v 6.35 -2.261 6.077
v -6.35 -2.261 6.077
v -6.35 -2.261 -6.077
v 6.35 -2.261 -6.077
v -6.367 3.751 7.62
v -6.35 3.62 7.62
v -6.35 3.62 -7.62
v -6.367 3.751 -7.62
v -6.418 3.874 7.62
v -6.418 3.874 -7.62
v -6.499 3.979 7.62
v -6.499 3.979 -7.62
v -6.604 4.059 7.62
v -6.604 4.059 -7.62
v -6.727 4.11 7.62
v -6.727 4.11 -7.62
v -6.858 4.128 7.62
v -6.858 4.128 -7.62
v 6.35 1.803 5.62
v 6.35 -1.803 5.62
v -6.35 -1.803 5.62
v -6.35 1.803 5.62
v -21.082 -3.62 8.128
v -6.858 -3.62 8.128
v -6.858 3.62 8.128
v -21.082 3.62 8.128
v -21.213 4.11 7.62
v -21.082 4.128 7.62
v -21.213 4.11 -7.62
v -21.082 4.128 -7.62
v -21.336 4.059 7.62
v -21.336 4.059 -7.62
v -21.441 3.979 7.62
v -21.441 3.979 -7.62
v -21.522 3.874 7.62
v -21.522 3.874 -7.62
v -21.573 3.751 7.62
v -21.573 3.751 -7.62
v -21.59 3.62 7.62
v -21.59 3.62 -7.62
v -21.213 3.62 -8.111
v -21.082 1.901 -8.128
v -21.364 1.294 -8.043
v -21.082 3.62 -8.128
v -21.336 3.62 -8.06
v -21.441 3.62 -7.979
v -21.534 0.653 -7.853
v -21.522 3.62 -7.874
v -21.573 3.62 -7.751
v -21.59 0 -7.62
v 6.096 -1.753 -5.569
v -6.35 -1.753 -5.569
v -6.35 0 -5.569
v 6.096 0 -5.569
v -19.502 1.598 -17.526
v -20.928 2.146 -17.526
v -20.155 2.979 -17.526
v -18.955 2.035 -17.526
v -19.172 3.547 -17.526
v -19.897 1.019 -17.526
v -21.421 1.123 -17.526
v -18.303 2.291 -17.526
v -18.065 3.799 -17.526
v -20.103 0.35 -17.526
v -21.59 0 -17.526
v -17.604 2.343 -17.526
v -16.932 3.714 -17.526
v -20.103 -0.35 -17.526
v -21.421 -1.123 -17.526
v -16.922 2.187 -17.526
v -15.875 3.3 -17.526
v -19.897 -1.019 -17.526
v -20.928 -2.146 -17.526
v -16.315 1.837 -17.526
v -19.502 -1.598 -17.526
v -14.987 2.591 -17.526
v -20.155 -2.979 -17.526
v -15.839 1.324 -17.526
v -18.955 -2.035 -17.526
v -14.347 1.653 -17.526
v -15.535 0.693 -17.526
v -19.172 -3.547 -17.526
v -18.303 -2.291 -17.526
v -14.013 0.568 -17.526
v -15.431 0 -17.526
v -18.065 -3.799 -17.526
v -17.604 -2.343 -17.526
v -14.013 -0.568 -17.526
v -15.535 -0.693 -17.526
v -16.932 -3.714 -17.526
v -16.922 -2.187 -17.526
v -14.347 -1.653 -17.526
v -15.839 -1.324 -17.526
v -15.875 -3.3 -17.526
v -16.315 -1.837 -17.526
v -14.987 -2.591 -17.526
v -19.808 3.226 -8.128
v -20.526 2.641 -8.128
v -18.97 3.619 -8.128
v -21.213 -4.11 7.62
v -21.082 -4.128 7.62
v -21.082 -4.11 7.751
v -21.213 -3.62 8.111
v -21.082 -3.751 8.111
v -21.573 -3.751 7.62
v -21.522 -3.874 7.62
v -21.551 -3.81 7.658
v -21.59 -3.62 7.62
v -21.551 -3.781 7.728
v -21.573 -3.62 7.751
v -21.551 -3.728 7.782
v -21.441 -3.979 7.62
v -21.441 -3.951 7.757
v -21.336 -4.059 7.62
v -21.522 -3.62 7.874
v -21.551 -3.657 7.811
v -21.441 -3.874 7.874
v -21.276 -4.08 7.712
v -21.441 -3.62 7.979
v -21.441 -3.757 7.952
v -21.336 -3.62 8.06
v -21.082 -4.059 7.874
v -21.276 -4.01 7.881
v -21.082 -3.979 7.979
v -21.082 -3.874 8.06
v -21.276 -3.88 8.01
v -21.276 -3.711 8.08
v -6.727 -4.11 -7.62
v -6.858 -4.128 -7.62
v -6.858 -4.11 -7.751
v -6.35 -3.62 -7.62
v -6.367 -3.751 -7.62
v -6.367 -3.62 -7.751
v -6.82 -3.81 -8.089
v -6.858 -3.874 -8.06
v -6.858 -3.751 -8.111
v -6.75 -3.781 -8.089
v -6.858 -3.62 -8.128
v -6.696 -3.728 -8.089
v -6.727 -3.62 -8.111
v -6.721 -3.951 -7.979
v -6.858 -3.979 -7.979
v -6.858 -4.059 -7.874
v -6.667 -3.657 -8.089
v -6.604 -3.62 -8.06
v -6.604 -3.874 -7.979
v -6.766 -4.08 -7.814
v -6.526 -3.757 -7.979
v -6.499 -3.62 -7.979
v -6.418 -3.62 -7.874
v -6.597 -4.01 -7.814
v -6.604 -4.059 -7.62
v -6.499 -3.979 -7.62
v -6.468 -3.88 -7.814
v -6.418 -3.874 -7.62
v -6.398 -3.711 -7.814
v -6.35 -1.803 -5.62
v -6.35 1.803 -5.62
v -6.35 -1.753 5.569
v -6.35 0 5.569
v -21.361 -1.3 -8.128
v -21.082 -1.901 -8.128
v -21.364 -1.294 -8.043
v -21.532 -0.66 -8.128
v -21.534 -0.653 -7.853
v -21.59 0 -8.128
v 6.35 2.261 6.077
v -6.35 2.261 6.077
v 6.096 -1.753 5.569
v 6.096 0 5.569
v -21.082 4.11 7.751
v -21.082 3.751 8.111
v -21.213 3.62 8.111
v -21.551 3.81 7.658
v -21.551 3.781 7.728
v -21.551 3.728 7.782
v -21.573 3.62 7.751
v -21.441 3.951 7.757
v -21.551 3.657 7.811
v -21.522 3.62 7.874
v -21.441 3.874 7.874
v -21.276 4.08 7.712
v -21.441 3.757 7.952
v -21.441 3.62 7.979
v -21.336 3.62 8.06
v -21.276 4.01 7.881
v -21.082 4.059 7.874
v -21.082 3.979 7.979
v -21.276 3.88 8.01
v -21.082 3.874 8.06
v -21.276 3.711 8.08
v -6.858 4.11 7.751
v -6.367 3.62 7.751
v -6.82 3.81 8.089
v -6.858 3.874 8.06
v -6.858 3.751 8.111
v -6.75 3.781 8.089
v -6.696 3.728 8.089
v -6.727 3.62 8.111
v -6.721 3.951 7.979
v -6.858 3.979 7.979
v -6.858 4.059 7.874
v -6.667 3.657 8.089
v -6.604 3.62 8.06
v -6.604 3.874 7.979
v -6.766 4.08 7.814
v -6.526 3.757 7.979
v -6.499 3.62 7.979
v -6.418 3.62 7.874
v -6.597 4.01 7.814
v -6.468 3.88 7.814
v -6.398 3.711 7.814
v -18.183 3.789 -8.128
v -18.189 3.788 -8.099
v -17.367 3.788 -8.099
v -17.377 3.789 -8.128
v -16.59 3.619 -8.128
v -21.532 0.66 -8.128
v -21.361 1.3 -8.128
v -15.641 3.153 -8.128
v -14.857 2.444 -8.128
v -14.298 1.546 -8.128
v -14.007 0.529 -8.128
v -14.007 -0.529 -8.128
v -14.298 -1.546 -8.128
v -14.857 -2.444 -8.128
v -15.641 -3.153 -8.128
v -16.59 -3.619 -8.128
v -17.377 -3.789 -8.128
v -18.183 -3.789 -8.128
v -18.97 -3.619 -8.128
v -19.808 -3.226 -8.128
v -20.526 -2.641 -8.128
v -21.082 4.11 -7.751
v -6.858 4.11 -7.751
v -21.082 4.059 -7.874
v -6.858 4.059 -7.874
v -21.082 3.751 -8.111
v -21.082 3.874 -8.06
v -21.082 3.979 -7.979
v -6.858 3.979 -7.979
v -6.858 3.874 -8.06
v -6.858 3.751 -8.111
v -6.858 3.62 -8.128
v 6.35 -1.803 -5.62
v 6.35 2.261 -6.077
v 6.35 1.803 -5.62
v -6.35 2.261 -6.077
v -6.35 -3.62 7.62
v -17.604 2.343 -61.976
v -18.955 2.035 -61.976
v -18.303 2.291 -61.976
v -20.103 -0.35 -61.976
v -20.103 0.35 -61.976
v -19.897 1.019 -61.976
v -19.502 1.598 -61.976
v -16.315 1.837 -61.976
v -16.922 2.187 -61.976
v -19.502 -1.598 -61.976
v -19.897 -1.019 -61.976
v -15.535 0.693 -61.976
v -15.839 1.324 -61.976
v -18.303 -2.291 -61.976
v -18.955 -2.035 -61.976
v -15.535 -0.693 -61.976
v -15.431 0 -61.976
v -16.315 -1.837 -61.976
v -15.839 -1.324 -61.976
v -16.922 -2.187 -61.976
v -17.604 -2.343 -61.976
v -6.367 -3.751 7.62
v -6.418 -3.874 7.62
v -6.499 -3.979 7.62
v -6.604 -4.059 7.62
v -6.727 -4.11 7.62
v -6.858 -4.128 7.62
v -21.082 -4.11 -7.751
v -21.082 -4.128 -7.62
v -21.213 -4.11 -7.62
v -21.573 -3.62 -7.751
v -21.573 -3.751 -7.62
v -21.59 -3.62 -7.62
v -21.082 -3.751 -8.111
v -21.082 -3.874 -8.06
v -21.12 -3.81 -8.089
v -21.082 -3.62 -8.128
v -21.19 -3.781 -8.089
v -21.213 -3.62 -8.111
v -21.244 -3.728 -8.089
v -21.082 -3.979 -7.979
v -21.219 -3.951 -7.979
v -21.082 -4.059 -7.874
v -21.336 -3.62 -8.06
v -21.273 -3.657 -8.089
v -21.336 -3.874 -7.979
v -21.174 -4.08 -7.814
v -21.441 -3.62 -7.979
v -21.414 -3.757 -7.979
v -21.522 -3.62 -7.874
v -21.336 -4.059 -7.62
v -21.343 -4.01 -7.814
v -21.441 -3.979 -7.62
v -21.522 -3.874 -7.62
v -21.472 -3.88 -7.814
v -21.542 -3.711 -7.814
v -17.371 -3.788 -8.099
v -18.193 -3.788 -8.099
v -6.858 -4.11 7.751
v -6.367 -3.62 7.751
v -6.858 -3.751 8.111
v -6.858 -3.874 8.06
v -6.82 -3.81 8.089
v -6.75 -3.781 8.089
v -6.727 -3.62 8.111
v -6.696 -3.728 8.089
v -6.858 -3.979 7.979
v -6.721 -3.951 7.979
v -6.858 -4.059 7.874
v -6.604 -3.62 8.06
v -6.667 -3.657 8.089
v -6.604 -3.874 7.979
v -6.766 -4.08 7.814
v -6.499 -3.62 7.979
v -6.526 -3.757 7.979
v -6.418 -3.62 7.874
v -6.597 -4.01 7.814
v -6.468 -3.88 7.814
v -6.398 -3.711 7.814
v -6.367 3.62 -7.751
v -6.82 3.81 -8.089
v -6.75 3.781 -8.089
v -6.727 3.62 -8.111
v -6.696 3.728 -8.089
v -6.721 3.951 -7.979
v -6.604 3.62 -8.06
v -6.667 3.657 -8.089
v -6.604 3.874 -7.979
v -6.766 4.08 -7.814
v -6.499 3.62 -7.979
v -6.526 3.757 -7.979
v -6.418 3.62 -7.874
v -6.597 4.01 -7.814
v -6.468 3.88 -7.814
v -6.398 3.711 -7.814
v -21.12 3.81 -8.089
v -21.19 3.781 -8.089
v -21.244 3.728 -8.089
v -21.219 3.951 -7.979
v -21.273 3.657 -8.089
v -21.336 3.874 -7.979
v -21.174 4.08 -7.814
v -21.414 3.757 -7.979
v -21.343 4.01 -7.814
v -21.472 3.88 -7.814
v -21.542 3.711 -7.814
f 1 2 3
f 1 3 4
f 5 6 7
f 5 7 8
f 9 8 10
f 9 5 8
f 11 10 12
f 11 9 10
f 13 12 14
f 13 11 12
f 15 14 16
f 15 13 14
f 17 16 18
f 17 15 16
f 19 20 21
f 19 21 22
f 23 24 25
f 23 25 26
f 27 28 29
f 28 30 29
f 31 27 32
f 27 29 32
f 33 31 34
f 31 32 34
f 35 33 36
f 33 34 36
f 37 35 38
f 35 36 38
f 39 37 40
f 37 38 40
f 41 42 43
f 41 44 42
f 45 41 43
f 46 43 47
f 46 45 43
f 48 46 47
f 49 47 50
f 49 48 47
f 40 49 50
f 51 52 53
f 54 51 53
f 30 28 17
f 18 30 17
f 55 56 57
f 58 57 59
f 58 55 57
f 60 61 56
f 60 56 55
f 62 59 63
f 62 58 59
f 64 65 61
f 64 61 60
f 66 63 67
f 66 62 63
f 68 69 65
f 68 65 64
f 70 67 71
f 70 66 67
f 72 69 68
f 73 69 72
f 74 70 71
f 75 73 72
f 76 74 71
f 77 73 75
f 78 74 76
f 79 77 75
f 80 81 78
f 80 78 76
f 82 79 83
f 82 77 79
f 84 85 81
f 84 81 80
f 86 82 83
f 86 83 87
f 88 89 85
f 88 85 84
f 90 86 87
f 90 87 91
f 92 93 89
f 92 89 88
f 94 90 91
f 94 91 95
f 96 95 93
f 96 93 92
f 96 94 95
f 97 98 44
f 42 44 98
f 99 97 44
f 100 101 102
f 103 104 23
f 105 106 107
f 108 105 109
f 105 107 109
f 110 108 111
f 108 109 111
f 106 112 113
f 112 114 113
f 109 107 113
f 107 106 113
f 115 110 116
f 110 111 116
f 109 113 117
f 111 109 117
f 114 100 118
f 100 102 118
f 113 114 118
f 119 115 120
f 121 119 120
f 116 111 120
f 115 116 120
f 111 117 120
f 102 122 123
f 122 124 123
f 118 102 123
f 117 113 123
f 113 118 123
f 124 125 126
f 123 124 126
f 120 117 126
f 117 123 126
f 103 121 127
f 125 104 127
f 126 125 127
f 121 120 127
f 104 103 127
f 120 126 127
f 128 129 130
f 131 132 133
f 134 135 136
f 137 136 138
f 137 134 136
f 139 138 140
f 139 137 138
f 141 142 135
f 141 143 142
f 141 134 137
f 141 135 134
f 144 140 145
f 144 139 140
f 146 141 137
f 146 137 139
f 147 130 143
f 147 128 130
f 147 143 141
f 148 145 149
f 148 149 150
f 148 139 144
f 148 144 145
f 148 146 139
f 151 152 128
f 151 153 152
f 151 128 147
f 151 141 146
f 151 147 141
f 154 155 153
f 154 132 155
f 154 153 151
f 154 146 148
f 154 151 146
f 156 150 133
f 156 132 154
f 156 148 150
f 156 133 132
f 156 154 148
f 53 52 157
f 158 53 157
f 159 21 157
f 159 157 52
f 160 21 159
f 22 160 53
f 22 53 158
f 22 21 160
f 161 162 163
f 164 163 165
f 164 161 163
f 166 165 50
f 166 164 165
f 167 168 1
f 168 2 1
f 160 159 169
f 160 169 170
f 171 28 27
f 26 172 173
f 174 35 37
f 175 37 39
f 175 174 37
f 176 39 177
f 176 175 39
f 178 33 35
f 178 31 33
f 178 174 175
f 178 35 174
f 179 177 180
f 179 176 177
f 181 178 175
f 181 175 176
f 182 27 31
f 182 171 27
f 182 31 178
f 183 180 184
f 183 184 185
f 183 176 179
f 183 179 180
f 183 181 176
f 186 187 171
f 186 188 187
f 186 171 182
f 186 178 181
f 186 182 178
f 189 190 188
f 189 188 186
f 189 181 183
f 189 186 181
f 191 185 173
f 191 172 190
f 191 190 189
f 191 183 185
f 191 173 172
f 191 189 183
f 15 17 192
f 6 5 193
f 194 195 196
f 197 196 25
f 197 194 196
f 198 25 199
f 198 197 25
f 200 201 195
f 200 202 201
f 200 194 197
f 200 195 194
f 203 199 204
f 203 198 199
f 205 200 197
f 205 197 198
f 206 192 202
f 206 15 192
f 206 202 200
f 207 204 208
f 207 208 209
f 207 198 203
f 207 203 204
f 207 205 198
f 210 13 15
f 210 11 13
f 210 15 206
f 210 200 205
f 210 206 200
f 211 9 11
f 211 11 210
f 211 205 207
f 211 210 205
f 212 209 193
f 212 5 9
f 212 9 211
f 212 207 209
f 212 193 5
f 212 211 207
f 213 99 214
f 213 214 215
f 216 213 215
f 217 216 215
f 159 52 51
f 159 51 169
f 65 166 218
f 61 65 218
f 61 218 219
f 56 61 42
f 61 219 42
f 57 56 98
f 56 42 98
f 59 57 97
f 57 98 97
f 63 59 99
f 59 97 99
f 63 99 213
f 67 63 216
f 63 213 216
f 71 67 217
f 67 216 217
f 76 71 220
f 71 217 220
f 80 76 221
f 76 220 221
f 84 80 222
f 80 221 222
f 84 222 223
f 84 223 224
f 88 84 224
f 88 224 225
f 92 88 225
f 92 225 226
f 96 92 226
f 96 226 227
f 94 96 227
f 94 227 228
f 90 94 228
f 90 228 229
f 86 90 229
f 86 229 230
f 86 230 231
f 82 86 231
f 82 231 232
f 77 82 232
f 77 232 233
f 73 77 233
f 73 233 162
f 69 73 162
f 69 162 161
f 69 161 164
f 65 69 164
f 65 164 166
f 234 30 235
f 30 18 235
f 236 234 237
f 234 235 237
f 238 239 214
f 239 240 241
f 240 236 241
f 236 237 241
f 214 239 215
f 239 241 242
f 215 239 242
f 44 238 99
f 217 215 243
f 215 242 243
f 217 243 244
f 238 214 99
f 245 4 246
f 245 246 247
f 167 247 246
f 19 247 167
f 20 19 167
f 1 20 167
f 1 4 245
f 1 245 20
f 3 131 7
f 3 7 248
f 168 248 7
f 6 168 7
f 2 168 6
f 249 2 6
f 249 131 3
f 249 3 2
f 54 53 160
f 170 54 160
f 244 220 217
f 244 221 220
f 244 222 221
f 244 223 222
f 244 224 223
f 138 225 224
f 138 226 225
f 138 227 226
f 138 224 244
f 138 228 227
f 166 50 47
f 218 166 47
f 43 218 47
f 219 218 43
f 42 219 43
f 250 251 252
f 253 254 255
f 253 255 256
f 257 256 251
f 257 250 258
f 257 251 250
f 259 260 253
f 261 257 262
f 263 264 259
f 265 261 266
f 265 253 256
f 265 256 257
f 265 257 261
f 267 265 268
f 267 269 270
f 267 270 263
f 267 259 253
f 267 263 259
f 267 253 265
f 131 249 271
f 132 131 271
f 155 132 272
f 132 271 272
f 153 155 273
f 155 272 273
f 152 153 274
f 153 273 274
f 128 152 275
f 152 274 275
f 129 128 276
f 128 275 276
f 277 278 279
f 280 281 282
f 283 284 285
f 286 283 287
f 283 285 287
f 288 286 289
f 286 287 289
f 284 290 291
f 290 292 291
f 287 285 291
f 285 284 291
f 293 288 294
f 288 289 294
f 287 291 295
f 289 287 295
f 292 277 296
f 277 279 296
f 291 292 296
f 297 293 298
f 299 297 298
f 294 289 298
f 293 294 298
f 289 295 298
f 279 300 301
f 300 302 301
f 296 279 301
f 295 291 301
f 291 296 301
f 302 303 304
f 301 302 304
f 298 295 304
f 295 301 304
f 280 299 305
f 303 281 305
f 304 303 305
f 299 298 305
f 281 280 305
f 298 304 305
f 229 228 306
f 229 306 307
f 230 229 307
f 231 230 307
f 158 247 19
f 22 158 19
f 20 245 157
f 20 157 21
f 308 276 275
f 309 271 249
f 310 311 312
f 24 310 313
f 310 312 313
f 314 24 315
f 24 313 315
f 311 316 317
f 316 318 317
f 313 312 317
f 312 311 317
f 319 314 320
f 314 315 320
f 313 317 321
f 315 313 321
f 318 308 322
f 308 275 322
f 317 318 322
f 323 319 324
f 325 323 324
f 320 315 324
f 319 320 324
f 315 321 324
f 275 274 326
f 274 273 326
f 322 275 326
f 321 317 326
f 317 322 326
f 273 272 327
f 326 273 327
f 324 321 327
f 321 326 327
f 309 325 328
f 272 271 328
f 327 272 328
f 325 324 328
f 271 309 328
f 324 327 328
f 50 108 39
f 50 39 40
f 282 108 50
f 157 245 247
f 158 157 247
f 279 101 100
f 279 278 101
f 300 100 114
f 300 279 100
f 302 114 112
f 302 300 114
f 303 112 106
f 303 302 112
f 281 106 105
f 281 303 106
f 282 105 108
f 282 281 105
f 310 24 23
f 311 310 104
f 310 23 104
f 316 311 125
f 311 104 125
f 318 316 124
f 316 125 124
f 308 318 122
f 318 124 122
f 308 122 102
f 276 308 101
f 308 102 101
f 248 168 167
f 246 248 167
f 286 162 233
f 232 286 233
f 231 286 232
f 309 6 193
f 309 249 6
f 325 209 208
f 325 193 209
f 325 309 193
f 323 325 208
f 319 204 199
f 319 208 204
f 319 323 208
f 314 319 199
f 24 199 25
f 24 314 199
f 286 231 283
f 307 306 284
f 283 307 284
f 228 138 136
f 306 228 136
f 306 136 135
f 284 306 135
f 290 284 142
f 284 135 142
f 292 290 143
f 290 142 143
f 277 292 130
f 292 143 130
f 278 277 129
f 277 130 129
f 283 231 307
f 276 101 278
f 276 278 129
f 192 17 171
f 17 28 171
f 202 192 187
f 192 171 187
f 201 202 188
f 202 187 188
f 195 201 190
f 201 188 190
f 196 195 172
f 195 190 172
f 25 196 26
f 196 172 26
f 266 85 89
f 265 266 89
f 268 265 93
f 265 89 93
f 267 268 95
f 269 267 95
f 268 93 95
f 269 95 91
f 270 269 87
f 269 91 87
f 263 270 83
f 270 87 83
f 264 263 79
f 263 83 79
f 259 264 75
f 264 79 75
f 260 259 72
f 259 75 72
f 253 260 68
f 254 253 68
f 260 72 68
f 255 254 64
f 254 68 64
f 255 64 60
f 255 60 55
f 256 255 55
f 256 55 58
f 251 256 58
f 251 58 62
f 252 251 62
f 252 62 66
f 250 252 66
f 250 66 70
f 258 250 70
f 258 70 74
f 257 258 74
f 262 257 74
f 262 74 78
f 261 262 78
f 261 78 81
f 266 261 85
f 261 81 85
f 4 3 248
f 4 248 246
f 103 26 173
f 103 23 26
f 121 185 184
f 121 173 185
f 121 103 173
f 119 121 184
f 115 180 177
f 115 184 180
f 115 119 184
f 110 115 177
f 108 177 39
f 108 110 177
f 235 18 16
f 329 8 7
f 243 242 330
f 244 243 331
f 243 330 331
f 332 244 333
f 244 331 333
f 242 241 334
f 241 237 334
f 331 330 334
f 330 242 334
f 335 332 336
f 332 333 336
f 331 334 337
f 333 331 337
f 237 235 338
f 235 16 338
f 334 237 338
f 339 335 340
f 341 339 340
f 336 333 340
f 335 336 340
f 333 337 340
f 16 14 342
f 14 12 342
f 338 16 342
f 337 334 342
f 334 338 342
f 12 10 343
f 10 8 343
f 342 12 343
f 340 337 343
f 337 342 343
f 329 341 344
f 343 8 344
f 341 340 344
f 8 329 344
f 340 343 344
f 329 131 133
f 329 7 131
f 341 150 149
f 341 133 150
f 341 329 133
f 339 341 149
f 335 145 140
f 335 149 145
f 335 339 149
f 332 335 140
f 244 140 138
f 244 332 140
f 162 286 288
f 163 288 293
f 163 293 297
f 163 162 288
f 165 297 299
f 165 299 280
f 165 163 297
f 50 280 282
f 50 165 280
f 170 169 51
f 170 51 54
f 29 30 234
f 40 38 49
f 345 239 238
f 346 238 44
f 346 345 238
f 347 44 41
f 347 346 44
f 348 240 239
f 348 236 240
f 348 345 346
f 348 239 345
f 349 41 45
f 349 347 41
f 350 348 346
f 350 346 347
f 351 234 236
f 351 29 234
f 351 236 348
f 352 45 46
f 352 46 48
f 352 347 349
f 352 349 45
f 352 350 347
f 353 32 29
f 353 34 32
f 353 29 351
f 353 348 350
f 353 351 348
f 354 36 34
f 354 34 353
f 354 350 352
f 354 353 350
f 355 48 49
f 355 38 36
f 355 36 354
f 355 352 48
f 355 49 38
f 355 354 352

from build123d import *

# Parameters (mm, degrees)
F0_W           = 12.7
F0_H           = 12.1539
F1_DEPTH       = 2.2606
F2_DEPTH       = 4.1275
F3_W           = 3.6068
F3_H           = 11.2395
F4_DEPTH       = 12.7
F5_DEPTH       = 12.7
F6_R           = 0.508
F7_W           = 1.7526
F7_H           = 11.1379
F8_DEPTH       = 12.446
F10_DEPTH      = 9.398
F10_DEPTH_BACK = 0.508
F11_R          = 2.3495
F12_DEPTH      = 44.45


with BuildPart() as f1:
    # F0 (on Front) → F1 (new body, symmetric)
    with BuildSketch(Plane.XZ):
        Rectangle(F0_W, F0_H)
    extrude(amount=F1_DEPTH, both=True)

    # F0 (on Front) → F2 (join, symmetric)
    with BuildSketch(Plane.XZ):
        Polygon((-6.35, -8.128), (-6.35, -6.07695), (-6.35, 6.07695), (-6.35, 8.128), (-21.59, 8.128), (-21.59, -8.128), align=None)
    extrude(amount=F2_DEPTH, both=True)

    # F3 (on face) → F4 (cut)
    with BuildSketch(Plane.YZ.offset(6.35)):
        Rectangle(F3_W, F3_H)
    extrude(amount=-F4_DEPTH, mode=Mode.SUBTRACT)

    # F3 (on face) → F5 (cut)
    with BuildSketch(Plane.YZ.offset(6.35)):
        Rectangle(F3_W, F3_H)
    extrude(amount=-F5_DEPTH, mode=Mode.SUBTRACT)

    # F6
    f6_edges = [f1.edges().sort_by_distance(p)[0] for p in [
        (-6.35, -4.1275, 0),
        (-13.97, -4.1275, 8.128),
        (-21.59, -4.1275, 0),
        (-13.97, -4.1275, -8.128),
        (-6.35, 4.1275, 0),
        (-13.97, 4.1275, 8.128),
        (-21.59, 4.1275, 0),
        (-13.97, 4.1275, -8.128),
        (-21.59, 0, -8.128),
        (-21.59, 0, 8.128),
        (-6.35, 0, 8.128),
        (-6.35, 0, -8.128),
    ]]
    fillet(f6_edges, radius=F6_R)

    # F7 (on face) → F8 (join)
    with BuildSketch(Plane.YZ.offset(-6.35)):
        with Locations((-0.8763, 0)):
            Rectangle(F7_W, F7_H)
    extrude(amount=F8_DEPTH)

    # F9 (on face) → F10 (join, two sides)
    with BuildSketch(Plane(origin=(0, 0, -8.128), x_dir=(1, 0, 0), z_dir=(0, 0, -1))) as f10_sk:
        with BuildLine():
            ThreePointArc((-13.97, 0), (-17.78, 3.81), (-21.59, 0))
            Line((-21.59, 0), (-13.97, 0))
        make_face()
        with BuildLine():
            Line((-13.97, 0), (-21.59, 0))
            ThreePointArc((-21.59, 0), (-17.78, -3.81), (-13.97, 0))
        make_face()
    extrude(amount=F10_DEPTH)
    extrude(f10_sk.sketch, amount=-F10_DEPTH_BACK)

    # F11 (on face) → F12 (join)
    with BuildSketch(Plane(origin=(0, 0, -17.526), x_dir=(1, 0, 0), z_dir=(0, 0, -1))):
        with Locations((-17.78, 0)):
            Circle(F11_R)
    extrude(amount=F12_DEPTH)


solid = f1.part
